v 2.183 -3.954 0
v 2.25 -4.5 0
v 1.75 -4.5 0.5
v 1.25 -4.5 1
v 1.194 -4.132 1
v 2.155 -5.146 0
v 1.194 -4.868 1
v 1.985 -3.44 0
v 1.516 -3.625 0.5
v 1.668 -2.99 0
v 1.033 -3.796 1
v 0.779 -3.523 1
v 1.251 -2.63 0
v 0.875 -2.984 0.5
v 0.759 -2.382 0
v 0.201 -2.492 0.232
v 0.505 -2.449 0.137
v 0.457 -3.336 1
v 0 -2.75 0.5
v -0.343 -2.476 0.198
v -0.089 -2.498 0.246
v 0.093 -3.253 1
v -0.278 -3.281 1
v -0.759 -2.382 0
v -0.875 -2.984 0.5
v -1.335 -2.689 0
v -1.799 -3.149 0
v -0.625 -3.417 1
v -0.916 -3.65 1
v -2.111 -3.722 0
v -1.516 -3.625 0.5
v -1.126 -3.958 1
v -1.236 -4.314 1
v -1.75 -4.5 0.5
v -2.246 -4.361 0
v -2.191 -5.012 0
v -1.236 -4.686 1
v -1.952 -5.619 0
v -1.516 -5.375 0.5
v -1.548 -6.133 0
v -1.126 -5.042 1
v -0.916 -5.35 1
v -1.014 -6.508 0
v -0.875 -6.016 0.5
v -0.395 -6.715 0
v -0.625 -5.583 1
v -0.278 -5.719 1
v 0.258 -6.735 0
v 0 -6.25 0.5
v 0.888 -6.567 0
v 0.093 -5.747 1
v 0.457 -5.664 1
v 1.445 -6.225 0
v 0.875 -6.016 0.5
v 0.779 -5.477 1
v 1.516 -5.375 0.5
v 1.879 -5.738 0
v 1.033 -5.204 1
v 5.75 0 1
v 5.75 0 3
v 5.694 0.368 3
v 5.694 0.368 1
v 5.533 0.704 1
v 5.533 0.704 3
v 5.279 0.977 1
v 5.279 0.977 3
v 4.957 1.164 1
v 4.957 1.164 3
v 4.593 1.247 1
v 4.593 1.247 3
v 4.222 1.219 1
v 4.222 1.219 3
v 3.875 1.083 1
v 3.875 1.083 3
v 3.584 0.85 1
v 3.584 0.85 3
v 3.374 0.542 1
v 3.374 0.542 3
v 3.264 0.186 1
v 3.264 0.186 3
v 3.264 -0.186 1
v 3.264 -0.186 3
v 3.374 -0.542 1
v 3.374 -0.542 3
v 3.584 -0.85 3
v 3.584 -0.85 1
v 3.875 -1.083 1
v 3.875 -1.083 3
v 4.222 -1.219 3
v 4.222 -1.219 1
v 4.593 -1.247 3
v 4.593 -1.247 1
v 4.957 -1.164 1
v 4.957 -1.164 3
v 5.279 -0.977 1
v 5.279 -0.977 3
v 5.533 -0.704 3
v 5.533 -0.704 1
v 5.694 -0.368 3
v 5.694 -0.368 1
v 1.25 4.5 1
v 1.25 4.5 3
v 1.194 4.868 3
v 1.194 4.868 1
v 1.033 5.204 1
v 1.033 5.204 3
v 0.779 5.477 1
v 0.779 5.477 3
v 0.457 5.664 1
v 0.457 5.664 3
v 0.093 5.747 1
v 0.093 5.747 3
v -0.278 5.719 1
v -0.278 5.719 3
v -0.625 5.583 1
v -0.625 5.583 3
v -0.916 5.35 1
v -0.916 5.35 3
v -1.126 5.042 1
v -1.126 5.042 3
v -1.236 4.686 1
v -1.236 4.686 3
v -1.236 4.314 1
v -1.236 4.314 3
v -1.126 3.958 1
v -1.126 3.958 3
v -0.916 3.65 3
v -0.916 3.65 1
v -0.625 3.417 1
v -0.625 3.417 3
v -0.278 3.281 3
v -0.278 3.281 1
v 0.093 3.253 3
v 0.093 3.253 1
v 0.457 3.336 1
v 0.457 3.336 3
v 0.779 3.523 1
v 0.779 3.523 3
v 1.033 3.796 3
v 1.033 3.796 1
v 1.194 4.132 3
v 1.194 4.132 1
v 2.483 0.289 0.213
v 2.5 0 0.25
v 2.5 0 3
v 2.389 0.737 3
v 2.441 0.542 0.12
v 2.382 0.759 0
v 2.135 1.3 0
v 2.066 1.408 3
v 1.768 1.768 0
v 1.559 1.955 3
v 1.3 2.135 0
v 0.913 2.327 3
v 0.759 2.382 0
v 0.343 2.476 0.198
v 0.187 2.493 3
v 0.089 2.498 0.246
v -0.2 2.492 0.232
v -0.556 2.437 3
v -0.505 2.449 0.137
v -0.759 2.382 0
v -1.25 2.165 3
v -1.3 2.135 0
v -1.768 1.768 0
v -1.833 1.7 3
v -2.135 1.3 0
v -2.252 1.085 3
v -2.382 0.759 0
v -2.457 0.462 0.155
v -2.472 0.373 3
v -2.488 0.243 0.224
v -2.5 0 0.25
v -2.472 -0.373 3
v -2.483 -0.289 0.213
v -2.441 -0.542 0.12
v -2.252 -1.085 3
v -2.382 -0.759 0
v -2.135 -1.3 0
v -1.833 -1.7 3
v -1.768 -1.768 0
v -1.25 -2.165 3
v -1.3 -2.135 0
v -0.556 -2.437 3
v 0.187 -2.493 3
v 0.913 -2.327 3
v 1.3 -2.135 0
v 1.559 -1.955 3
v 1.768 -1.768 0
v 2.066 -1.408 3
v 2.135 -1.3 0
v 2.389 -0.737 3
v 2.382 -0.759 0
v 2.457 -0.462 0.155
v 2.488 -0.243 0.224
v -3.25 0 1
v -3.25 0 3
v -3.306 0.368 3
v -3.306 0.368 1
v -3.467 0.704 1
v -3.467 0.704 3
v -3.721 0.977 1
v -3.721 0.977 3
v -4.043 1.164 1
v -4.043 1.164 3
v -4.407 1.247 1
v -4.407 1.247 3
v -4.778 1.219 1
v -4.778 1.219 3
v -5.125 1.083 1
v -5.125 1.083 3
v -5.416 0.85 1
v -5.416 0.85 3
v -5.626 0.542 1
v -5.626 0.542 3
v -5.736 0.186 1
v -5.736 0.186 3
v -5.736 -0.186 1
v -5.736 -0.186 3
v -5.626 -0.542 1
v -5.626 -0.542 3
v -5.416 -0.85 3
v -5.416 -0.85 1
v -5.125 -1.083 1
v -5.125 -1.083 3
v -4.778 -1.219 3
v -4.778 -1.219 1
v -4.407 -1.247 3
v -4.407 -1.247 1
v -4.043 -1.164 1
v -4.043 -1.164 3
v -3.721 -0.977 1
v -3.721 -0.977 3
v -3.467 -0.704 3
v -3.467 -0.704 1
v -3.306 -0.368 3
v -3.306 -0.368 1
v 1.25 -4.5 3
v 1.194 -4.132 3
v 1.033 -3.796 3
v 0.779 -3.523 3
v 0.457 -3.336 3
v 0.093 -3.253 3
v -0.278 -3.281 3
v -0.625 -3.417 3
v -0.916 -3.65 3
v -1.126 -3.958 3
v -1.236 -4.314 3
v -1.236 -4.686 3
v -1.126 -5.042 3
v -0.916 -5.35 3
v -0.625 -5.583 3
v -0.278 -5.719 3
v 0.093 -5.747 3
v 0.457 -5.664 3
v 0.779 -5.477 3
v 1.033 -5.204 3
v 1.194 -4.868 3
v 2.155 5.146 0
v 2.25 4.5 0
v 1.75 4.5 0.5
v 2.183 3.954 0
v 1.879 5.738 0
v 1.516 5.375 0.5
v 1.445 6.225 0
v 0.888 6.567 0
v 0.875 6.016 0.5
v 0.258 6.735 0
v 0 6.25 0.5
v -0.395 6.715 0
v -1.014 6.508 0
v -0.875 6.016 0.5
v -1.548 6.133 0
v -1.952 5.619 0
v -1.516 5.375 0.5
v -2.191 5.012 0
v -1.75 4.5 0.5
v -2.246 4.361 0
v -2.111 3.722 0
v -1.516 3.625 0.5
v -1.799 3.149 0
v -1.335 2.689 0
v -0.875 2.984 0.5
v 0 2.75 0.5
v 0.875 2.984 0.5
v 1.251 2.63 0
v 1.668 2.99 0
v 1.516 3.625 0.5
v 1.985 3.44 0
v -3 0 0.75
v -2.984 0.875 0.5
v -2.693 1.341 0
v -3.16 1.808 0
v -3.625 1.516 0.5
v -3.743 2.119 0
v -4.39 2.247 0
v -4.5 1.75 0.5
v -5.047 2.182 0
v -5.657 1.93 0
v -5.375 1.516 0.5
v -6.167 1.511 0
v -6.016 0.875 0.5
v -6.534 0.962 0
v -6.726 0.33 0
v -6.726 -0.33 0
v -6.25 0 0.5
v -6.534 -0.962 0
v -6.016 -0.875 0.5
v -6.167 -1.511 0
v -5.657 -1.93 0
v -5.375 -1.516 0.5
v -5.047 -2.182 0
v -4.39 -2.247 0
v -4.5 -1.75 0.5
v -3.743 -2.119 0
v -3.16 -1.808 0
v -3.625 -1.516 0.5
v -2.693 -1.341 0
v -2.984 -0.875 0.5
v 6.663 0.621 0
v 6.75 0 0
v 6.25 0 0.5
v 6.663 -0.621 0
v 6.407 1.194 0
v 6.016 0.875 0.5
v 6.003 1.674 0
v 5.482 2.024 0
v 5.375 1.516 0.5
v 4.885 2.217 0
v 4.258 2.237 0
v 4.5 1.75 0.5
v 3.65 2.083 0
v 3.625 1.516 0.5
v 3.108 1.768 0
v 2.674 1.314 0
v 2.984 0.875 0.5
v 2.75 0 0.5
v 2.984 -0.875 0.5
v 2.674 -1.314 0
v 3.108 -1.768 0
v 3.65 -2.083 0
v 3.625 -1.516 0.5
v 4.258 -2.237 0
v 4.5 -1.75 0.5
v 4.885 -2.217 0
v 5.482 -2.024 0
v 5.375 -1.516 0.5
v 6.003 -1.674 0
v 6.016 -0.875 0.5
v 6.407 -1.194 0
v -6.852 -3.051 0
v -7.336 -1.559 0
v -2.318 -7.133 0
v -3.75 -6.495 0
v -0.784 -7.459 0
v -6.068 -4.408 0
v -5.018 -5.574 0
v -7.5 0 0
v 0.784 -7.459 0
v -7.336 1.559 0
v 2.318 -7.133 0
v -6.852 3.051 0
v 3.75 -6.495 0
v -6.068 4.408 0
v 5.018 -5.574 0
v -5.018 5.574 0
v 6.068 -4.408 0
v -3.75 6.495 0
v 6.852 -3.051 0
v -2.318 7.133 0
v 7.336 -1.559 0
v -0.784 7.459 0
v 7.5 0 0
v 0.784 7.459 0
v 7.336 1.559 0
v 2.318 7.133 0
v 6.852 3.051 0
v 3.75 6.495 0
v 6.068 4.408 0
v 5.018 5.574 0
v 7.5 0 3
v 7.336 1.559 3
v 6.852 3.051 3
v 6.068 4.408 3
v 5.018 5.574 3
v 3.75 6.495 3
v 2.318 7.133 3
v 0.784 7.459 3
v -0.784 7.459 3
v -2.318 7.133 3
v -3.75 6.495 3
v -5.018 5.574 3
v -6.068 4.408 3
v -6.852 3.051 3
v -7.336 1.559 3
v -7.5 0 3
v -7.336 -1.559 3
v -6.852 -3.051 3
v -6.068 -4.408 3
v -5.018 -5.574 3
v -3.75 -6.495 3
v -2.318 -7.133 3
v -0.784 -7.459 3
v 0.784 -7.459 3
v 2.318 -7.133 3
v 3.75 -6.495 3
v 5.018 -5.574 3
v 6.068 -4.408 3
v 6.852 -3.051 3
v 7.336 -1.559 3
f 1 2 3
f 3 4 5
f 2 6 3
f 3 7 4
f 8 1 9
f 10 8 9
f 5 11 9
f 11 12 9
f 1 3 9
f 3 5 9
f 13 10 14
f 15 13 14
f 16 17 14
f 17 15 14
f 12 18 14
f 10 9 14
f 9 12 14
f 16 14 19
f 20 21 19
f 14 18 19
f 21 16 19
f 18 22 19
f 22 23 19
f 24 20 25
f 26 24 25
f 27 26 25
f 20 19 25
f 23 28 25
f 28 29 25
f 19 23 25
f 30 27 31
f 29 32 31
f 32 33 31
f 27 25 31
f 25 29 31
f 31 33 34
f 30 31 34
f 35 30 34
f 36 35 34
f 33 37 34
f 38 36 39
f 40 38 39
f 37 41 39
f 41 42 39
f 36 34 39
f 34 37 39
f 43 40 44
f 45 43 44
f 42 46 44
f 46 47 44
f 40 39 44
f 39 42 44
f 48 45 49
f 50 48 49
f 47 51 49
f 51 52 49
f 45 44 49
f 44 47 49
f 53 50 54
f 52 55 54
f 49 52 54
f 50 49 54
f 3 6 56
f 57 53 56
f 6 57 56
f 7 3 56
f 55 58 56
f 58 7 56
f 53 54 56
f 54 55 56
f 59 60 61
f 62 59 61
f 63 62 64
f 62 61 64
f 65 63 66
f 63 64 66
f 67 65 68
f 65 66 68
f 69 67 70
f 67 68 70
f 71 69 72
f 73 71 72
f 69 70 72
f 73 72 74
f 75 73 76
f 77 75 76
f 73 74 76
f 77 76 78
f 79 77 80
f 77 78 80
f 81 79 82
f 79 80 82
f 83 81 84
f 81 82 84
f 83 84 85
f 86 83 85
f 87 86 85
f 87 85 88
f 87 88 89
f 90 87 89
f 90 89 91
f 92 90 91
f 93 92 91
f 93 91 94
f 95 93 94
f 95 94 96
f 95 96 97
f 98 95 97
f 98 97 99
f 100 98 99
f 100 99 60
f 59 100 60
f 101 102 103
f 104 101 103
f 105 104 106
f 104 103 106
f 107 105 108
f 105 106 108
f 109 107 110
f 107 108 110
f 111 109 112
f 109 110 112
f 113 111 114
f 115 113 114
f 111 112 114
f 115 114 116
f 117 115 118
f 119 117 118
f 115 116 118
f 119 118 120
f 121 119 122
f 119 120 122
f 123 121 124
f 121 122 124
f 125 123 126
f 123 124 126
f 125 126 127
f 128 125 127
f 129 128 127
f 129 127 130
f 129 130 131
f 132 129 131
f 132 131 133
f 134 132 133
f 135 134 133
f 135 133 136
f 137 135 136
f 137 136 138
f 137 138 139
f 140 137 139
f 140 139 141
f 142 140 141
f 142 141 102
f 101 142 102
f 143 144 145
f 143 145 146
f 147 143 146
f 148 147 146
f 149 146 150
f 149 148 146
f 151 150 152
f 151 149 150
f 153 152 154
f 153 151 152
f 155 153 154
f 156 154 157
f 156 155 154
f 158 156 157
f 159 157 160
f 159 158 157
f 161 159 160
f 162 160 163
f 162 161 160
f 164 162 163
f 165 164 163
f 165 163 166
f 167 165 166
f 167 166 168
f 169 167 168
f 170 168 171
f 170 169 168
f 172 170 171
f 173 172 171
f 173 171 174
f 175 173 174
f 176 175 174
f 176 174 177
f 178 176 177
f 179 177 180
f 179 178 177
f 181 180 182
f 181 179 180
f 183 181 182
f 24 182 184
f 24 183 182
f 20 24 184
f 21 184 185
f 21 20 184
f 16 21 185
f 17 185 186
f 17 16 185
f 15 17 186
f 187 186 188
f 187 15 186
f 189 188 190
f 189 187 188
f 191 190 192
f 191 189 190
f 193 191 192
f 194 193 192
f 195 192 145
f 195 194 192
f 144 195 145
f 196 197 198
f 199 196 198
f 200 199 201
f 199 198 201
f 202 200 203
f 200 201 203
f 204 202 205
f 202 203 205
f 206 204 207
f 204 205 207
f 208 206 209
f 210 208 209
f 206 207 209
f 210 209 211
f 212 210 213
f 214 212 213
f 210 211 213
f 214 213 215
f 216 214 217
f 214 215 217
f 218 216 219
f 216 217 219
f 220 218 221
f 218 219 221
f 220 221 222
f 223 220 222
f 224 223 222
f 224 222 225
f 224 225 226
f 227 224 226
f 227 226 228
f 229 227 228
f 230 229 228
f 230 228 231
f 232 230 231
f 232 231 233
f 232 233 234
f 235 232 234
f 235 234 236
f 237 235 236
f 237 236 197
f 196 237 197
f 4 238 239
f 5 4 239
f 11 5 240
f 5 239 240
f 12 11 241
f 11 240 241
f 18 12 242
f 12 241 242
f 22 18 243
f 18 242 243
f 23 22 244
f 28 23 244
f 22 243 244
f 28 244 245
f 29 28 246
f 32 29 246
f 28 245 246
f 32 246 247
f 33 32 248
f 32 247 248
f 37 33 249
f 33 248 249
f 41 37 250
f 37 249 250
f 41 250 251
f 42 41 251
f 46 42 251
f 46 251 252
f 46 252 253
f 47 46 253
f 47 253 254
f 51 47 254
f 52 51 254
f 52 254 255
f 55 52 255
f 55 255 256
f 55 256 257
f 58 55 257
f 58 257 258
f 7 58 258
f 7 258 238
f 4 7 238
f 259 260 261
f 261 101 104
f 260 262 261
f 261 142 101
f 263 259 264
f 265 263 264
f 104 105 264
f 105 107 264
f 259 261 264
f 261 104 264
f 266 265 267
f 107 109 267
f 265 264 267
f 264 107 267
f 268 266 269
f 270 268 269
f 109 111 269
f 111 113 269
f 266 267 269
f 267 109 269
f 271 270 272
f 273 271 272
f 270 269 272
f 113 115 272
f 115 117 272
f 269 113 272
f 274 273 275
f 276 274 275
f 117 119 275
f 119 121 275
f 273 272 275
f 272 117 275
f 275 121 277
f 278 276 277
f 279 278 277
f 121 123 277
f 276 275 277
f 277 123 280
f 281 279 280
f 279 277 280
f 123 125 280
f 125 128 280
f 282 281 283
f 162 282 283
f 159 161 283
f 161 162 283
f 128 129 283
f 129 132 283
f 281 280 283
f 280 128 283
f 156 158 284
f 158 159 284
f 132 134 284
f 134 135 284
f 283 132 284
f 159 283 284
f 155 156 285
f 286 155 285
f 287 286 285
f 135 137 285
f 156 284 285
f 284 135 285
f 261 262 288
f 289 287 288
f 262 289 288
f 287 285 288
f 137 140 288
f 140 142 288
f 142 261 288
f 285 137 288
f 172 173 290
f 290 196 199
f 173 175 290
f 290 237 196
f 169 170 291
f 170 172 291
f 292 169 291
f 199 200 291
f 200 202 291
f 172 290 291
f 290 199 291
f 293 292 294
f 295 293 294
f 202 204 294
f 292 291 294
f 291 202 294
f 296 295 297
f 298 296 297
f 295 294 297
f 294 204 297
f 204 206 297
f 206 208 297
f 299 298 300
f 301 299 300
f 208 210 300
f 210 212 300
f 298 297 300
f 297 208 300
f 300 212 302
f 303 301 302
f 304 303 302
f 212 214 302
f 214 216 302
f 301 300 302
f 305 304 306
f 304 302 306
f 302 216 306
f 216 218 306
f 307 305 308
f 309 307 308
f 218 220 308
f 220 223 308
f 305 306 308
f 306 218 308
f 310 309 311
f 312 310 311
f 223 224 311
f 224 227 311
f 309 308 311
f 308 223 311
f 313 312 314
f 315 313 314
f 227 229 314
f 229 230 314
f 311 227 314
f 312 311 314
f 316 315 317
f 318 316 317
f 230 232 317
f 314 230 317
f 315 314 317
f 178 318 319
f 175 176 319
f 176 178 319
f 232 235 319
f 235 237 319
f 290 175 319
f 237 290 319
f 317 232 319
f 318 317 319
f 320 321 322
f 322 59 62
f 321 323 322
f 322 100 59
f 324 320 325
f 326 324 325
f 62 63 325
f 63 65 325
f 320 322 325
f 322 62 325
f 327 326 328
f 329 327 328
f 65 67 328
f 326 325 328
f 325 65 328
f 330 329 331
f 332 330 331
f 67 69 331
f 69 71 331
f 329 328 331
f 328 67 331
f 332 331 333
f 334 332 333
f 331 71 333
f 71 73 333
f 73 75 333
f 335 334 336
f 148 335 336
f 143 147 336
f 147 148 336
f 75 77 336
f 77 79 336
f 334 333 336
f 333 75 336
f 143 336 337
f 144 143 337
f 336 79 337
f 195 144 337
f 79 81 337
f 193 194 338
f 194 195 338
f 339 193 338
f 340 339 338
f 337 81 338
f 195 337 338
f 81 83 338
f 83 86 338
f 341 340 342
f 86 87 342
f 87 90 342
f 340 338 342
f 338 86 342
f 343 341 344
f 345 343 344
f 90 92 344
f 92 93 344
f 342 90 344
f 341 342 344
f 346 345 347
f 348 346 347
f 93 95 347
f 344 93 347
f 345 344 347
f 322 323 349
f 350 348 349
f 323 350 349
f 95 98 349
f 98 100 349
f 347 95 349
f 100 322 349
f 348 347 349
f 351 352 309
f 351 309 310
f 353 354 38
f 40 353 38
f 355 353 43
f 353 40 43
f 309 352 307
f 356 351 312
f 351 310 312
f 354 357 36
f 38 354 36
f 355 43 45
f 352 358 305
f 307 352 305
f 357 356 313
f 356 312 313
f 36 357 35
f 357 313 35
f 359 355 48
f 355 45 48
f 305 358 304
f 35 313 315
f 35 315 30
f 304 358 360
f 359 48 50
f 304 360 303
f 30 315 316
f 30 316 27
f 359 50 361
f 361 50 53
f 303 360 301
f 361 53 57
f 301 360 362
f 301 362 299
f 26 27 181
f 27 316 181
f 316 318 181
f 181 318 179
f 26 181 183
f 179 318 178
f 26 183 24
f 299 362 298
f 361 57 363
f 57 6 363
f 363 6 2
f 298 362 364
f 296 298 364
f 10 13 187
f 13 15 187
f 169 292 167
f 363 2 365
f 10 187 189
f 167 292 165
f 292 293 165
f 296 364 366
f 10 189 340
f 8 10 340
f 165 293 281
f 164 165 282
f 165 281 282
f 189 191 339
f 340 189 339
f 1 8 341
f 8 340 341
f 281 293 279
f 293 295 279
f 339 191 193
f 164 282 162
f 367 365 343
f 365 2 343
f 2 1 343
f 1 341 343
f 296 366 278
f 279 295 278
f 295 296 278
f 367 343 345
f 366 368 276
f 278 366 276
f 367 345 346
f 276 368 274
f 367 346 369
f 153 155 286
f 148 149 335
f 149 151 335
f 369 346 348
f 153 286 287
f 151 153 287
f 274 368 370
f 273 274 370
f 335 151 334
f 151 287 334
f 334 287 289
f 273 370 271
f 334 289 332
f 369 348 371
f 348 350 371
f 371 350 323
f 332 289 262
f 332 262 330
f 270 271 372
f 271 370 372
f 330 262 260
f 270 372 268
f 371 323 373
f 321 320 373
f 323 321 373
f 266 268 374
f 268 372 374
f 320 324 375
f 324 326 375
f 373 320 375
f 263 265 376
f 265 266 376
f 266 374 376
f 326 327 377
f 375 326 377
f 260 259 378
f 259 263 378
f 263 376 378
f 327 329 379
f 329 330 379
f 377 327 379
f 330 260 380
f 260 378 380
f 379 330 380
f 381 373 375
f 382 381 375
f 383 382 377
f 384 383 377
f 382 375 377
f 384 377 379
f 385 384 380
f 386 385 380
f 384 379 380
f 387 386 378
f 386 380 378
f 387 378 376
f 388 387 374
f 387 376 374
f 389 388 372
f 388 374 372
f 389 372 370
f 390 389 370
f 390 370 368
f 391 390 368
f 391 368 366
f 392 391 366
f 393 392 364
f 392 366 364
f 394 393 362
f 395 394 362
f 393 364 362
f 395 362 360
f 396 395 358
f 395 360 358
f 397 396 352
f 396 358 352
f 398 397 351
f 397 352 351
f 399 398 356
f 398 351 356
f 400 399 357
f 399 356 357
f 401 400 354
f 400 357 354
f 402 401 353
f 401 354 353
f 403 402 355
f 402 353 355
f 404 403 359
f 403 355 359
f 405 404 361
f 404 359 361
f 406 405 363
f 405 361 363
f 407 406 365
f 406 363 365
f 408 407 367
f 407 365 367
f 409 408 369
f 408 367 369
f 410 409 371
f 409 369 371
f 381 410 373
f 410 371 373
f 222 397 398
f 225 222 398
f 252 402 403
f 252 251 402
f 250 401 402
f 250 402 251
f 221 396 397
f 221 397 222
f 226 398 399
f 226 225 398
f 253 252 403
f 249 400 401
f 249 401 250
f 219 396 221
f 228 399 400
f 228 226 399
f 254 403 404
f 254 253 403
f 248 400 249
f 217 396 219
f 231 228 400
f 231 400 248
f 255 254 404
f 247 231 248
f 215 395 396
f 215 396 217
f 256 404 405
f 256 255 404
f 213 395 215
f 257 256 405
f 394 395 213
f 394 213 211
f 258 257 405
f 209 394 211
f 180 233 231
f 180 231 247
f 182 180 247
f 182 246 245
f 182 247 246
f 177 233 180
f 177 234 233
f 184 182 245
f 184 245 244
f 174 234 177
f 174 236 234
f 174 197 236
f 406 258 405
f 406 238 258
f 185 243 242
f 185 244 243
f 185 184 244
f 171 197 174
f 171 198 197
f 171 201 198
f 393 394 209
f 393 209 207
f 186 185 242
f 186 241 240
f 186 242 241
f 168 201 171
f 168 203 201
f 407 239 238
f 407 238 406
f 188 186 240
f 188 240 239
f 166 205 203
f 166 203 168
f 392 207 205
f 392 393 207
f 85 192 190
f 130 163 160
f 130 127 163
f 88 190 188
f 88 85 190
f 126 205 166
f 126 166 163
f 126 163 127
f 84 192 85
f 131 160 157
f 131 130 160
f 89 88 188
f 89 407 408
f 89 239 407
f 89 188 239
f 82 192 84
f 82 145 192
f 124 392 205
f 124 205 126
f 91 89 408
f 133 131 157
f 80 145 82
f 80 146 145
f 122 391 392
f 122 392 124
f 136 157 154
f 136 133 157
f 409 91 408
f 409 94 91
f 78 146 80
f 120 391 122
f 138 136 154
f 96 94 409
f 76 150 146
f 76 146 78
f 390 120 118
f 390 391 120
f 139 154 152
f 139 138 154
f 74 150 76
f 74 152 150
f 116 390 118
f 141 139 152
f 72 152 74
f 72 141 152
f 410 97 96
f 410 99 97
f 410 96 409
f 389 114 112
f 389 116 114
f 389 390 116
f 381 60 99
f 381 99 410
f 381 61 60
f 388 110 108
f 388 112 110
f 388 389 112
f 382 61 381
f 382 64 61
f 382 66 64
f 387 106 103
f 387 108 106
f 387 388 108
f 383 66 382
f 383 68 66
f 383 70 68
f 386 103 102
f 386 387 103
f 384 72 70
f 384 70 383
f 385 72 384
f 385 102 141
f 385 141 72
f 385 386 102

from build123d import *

# Parameters (mm, degrees)
SKETCH_1_R          = 7.5
SKETCH_1_R_2        = 2.5
EXTRUDE_1_DEPTH     = 3
SKETCH_2_R          = 1.25
CUT_EXTRUDE_1_DEPTH = 10
CHAMFER_1_SIZE      = 1


with BuildPart() as part:
    # 草图1 → 凸台-拉伸1 (new body)
    with BuildSketch(Plane.XY):
        Circle(SKETCH_1_R)
        Circle(SKETCH_1_R_2, mode=Mode.SUBTRACT)
    extrude(amount=EXTRUDE_1_DEPTH)

    # 草图2 → 切除-拉伸1 (cut)
    with BuildSketch(Plane.XY.offset(3)):
        with Locations((0, 4.5)):
            Circle(SKETCH_2_R)
        with Locations((4.5, 0)):
            Circle(SKETCH_2_R)
        with Locations((0, -4.5)):
            Circle(SKETCH_2_R)
        with Locations((-4.5, 0)):
            Circle(SKETCH_2_R)
    extrude(amount=-CUT_EXTRUDE_1_DEPTH, mode=Mode.SUBTRACT)

    # 倒角1
    # the kernel refuses this chamfer: 1 mm, written as the material it takes off along each edge
    with BuildSketch(Plane(origin=(0, 4.5, 0), x_dir=(1, 0, 0), z_dir=(0, -1, 0))) as chamfer_1_piece_1:
        Polygon((1.25 + CHAMFER_1_SIZE, 0), (1.25, CHAMFER_1_SIZE), (1.25, 0), align=None)
    revolve(axis=Axis((0, 4.5, 0), (0, 0, 1)), mode=Mode.SUBTRACT)
    with BuildSketch(Plane(origin=(4.5, 0, 0), x_dir=(1, 0, 0), z_dir=(0, -1, 0))) as chamfer_1_piece_2:
        Polygon((1.25 + CHAMFER_1_SIZE, 0), (1.25, CHAMFER_1_SIZE), (1.25, 0), align=None)
    revolve(axis=Axis((4.5, 0, 0), (0, 0, 1)), mode=Mode.SUBTRACT)
    with BuildSketch(Plane(origin=(0, -4.5, 0), x_dir=(1, 0, 0), z_dir=(0, -1, 0))) as chamfer_1_piece_3:
        Polygon((1.25 + CHAMFER_1_SIZE, 0), (1.25, CHAMFER_1_SIZE), (1.25, 0), align=None)
    revolve(axis=Axis((0, -4.5, 0), (0, 0, 1)), mode=Mode.SUBTRACT)
    with BuildSketch(Plane(origin=(-4.5, 0, 0), x_dir=(1, 0, 0), z_dir=(0, -1, 0))) as chamfer_1_piece_4:
        Polygon((1.25 + CHAMFER_1_SIZE, 0), (1.25, CHAMFER_1_SIZE), (1.25, 0), align=None)
    revolve(axis=Axis((-4.5, 0, 0), (0, 0, 1)), mode=Mode.SUBTRACT)


solid = part.part
